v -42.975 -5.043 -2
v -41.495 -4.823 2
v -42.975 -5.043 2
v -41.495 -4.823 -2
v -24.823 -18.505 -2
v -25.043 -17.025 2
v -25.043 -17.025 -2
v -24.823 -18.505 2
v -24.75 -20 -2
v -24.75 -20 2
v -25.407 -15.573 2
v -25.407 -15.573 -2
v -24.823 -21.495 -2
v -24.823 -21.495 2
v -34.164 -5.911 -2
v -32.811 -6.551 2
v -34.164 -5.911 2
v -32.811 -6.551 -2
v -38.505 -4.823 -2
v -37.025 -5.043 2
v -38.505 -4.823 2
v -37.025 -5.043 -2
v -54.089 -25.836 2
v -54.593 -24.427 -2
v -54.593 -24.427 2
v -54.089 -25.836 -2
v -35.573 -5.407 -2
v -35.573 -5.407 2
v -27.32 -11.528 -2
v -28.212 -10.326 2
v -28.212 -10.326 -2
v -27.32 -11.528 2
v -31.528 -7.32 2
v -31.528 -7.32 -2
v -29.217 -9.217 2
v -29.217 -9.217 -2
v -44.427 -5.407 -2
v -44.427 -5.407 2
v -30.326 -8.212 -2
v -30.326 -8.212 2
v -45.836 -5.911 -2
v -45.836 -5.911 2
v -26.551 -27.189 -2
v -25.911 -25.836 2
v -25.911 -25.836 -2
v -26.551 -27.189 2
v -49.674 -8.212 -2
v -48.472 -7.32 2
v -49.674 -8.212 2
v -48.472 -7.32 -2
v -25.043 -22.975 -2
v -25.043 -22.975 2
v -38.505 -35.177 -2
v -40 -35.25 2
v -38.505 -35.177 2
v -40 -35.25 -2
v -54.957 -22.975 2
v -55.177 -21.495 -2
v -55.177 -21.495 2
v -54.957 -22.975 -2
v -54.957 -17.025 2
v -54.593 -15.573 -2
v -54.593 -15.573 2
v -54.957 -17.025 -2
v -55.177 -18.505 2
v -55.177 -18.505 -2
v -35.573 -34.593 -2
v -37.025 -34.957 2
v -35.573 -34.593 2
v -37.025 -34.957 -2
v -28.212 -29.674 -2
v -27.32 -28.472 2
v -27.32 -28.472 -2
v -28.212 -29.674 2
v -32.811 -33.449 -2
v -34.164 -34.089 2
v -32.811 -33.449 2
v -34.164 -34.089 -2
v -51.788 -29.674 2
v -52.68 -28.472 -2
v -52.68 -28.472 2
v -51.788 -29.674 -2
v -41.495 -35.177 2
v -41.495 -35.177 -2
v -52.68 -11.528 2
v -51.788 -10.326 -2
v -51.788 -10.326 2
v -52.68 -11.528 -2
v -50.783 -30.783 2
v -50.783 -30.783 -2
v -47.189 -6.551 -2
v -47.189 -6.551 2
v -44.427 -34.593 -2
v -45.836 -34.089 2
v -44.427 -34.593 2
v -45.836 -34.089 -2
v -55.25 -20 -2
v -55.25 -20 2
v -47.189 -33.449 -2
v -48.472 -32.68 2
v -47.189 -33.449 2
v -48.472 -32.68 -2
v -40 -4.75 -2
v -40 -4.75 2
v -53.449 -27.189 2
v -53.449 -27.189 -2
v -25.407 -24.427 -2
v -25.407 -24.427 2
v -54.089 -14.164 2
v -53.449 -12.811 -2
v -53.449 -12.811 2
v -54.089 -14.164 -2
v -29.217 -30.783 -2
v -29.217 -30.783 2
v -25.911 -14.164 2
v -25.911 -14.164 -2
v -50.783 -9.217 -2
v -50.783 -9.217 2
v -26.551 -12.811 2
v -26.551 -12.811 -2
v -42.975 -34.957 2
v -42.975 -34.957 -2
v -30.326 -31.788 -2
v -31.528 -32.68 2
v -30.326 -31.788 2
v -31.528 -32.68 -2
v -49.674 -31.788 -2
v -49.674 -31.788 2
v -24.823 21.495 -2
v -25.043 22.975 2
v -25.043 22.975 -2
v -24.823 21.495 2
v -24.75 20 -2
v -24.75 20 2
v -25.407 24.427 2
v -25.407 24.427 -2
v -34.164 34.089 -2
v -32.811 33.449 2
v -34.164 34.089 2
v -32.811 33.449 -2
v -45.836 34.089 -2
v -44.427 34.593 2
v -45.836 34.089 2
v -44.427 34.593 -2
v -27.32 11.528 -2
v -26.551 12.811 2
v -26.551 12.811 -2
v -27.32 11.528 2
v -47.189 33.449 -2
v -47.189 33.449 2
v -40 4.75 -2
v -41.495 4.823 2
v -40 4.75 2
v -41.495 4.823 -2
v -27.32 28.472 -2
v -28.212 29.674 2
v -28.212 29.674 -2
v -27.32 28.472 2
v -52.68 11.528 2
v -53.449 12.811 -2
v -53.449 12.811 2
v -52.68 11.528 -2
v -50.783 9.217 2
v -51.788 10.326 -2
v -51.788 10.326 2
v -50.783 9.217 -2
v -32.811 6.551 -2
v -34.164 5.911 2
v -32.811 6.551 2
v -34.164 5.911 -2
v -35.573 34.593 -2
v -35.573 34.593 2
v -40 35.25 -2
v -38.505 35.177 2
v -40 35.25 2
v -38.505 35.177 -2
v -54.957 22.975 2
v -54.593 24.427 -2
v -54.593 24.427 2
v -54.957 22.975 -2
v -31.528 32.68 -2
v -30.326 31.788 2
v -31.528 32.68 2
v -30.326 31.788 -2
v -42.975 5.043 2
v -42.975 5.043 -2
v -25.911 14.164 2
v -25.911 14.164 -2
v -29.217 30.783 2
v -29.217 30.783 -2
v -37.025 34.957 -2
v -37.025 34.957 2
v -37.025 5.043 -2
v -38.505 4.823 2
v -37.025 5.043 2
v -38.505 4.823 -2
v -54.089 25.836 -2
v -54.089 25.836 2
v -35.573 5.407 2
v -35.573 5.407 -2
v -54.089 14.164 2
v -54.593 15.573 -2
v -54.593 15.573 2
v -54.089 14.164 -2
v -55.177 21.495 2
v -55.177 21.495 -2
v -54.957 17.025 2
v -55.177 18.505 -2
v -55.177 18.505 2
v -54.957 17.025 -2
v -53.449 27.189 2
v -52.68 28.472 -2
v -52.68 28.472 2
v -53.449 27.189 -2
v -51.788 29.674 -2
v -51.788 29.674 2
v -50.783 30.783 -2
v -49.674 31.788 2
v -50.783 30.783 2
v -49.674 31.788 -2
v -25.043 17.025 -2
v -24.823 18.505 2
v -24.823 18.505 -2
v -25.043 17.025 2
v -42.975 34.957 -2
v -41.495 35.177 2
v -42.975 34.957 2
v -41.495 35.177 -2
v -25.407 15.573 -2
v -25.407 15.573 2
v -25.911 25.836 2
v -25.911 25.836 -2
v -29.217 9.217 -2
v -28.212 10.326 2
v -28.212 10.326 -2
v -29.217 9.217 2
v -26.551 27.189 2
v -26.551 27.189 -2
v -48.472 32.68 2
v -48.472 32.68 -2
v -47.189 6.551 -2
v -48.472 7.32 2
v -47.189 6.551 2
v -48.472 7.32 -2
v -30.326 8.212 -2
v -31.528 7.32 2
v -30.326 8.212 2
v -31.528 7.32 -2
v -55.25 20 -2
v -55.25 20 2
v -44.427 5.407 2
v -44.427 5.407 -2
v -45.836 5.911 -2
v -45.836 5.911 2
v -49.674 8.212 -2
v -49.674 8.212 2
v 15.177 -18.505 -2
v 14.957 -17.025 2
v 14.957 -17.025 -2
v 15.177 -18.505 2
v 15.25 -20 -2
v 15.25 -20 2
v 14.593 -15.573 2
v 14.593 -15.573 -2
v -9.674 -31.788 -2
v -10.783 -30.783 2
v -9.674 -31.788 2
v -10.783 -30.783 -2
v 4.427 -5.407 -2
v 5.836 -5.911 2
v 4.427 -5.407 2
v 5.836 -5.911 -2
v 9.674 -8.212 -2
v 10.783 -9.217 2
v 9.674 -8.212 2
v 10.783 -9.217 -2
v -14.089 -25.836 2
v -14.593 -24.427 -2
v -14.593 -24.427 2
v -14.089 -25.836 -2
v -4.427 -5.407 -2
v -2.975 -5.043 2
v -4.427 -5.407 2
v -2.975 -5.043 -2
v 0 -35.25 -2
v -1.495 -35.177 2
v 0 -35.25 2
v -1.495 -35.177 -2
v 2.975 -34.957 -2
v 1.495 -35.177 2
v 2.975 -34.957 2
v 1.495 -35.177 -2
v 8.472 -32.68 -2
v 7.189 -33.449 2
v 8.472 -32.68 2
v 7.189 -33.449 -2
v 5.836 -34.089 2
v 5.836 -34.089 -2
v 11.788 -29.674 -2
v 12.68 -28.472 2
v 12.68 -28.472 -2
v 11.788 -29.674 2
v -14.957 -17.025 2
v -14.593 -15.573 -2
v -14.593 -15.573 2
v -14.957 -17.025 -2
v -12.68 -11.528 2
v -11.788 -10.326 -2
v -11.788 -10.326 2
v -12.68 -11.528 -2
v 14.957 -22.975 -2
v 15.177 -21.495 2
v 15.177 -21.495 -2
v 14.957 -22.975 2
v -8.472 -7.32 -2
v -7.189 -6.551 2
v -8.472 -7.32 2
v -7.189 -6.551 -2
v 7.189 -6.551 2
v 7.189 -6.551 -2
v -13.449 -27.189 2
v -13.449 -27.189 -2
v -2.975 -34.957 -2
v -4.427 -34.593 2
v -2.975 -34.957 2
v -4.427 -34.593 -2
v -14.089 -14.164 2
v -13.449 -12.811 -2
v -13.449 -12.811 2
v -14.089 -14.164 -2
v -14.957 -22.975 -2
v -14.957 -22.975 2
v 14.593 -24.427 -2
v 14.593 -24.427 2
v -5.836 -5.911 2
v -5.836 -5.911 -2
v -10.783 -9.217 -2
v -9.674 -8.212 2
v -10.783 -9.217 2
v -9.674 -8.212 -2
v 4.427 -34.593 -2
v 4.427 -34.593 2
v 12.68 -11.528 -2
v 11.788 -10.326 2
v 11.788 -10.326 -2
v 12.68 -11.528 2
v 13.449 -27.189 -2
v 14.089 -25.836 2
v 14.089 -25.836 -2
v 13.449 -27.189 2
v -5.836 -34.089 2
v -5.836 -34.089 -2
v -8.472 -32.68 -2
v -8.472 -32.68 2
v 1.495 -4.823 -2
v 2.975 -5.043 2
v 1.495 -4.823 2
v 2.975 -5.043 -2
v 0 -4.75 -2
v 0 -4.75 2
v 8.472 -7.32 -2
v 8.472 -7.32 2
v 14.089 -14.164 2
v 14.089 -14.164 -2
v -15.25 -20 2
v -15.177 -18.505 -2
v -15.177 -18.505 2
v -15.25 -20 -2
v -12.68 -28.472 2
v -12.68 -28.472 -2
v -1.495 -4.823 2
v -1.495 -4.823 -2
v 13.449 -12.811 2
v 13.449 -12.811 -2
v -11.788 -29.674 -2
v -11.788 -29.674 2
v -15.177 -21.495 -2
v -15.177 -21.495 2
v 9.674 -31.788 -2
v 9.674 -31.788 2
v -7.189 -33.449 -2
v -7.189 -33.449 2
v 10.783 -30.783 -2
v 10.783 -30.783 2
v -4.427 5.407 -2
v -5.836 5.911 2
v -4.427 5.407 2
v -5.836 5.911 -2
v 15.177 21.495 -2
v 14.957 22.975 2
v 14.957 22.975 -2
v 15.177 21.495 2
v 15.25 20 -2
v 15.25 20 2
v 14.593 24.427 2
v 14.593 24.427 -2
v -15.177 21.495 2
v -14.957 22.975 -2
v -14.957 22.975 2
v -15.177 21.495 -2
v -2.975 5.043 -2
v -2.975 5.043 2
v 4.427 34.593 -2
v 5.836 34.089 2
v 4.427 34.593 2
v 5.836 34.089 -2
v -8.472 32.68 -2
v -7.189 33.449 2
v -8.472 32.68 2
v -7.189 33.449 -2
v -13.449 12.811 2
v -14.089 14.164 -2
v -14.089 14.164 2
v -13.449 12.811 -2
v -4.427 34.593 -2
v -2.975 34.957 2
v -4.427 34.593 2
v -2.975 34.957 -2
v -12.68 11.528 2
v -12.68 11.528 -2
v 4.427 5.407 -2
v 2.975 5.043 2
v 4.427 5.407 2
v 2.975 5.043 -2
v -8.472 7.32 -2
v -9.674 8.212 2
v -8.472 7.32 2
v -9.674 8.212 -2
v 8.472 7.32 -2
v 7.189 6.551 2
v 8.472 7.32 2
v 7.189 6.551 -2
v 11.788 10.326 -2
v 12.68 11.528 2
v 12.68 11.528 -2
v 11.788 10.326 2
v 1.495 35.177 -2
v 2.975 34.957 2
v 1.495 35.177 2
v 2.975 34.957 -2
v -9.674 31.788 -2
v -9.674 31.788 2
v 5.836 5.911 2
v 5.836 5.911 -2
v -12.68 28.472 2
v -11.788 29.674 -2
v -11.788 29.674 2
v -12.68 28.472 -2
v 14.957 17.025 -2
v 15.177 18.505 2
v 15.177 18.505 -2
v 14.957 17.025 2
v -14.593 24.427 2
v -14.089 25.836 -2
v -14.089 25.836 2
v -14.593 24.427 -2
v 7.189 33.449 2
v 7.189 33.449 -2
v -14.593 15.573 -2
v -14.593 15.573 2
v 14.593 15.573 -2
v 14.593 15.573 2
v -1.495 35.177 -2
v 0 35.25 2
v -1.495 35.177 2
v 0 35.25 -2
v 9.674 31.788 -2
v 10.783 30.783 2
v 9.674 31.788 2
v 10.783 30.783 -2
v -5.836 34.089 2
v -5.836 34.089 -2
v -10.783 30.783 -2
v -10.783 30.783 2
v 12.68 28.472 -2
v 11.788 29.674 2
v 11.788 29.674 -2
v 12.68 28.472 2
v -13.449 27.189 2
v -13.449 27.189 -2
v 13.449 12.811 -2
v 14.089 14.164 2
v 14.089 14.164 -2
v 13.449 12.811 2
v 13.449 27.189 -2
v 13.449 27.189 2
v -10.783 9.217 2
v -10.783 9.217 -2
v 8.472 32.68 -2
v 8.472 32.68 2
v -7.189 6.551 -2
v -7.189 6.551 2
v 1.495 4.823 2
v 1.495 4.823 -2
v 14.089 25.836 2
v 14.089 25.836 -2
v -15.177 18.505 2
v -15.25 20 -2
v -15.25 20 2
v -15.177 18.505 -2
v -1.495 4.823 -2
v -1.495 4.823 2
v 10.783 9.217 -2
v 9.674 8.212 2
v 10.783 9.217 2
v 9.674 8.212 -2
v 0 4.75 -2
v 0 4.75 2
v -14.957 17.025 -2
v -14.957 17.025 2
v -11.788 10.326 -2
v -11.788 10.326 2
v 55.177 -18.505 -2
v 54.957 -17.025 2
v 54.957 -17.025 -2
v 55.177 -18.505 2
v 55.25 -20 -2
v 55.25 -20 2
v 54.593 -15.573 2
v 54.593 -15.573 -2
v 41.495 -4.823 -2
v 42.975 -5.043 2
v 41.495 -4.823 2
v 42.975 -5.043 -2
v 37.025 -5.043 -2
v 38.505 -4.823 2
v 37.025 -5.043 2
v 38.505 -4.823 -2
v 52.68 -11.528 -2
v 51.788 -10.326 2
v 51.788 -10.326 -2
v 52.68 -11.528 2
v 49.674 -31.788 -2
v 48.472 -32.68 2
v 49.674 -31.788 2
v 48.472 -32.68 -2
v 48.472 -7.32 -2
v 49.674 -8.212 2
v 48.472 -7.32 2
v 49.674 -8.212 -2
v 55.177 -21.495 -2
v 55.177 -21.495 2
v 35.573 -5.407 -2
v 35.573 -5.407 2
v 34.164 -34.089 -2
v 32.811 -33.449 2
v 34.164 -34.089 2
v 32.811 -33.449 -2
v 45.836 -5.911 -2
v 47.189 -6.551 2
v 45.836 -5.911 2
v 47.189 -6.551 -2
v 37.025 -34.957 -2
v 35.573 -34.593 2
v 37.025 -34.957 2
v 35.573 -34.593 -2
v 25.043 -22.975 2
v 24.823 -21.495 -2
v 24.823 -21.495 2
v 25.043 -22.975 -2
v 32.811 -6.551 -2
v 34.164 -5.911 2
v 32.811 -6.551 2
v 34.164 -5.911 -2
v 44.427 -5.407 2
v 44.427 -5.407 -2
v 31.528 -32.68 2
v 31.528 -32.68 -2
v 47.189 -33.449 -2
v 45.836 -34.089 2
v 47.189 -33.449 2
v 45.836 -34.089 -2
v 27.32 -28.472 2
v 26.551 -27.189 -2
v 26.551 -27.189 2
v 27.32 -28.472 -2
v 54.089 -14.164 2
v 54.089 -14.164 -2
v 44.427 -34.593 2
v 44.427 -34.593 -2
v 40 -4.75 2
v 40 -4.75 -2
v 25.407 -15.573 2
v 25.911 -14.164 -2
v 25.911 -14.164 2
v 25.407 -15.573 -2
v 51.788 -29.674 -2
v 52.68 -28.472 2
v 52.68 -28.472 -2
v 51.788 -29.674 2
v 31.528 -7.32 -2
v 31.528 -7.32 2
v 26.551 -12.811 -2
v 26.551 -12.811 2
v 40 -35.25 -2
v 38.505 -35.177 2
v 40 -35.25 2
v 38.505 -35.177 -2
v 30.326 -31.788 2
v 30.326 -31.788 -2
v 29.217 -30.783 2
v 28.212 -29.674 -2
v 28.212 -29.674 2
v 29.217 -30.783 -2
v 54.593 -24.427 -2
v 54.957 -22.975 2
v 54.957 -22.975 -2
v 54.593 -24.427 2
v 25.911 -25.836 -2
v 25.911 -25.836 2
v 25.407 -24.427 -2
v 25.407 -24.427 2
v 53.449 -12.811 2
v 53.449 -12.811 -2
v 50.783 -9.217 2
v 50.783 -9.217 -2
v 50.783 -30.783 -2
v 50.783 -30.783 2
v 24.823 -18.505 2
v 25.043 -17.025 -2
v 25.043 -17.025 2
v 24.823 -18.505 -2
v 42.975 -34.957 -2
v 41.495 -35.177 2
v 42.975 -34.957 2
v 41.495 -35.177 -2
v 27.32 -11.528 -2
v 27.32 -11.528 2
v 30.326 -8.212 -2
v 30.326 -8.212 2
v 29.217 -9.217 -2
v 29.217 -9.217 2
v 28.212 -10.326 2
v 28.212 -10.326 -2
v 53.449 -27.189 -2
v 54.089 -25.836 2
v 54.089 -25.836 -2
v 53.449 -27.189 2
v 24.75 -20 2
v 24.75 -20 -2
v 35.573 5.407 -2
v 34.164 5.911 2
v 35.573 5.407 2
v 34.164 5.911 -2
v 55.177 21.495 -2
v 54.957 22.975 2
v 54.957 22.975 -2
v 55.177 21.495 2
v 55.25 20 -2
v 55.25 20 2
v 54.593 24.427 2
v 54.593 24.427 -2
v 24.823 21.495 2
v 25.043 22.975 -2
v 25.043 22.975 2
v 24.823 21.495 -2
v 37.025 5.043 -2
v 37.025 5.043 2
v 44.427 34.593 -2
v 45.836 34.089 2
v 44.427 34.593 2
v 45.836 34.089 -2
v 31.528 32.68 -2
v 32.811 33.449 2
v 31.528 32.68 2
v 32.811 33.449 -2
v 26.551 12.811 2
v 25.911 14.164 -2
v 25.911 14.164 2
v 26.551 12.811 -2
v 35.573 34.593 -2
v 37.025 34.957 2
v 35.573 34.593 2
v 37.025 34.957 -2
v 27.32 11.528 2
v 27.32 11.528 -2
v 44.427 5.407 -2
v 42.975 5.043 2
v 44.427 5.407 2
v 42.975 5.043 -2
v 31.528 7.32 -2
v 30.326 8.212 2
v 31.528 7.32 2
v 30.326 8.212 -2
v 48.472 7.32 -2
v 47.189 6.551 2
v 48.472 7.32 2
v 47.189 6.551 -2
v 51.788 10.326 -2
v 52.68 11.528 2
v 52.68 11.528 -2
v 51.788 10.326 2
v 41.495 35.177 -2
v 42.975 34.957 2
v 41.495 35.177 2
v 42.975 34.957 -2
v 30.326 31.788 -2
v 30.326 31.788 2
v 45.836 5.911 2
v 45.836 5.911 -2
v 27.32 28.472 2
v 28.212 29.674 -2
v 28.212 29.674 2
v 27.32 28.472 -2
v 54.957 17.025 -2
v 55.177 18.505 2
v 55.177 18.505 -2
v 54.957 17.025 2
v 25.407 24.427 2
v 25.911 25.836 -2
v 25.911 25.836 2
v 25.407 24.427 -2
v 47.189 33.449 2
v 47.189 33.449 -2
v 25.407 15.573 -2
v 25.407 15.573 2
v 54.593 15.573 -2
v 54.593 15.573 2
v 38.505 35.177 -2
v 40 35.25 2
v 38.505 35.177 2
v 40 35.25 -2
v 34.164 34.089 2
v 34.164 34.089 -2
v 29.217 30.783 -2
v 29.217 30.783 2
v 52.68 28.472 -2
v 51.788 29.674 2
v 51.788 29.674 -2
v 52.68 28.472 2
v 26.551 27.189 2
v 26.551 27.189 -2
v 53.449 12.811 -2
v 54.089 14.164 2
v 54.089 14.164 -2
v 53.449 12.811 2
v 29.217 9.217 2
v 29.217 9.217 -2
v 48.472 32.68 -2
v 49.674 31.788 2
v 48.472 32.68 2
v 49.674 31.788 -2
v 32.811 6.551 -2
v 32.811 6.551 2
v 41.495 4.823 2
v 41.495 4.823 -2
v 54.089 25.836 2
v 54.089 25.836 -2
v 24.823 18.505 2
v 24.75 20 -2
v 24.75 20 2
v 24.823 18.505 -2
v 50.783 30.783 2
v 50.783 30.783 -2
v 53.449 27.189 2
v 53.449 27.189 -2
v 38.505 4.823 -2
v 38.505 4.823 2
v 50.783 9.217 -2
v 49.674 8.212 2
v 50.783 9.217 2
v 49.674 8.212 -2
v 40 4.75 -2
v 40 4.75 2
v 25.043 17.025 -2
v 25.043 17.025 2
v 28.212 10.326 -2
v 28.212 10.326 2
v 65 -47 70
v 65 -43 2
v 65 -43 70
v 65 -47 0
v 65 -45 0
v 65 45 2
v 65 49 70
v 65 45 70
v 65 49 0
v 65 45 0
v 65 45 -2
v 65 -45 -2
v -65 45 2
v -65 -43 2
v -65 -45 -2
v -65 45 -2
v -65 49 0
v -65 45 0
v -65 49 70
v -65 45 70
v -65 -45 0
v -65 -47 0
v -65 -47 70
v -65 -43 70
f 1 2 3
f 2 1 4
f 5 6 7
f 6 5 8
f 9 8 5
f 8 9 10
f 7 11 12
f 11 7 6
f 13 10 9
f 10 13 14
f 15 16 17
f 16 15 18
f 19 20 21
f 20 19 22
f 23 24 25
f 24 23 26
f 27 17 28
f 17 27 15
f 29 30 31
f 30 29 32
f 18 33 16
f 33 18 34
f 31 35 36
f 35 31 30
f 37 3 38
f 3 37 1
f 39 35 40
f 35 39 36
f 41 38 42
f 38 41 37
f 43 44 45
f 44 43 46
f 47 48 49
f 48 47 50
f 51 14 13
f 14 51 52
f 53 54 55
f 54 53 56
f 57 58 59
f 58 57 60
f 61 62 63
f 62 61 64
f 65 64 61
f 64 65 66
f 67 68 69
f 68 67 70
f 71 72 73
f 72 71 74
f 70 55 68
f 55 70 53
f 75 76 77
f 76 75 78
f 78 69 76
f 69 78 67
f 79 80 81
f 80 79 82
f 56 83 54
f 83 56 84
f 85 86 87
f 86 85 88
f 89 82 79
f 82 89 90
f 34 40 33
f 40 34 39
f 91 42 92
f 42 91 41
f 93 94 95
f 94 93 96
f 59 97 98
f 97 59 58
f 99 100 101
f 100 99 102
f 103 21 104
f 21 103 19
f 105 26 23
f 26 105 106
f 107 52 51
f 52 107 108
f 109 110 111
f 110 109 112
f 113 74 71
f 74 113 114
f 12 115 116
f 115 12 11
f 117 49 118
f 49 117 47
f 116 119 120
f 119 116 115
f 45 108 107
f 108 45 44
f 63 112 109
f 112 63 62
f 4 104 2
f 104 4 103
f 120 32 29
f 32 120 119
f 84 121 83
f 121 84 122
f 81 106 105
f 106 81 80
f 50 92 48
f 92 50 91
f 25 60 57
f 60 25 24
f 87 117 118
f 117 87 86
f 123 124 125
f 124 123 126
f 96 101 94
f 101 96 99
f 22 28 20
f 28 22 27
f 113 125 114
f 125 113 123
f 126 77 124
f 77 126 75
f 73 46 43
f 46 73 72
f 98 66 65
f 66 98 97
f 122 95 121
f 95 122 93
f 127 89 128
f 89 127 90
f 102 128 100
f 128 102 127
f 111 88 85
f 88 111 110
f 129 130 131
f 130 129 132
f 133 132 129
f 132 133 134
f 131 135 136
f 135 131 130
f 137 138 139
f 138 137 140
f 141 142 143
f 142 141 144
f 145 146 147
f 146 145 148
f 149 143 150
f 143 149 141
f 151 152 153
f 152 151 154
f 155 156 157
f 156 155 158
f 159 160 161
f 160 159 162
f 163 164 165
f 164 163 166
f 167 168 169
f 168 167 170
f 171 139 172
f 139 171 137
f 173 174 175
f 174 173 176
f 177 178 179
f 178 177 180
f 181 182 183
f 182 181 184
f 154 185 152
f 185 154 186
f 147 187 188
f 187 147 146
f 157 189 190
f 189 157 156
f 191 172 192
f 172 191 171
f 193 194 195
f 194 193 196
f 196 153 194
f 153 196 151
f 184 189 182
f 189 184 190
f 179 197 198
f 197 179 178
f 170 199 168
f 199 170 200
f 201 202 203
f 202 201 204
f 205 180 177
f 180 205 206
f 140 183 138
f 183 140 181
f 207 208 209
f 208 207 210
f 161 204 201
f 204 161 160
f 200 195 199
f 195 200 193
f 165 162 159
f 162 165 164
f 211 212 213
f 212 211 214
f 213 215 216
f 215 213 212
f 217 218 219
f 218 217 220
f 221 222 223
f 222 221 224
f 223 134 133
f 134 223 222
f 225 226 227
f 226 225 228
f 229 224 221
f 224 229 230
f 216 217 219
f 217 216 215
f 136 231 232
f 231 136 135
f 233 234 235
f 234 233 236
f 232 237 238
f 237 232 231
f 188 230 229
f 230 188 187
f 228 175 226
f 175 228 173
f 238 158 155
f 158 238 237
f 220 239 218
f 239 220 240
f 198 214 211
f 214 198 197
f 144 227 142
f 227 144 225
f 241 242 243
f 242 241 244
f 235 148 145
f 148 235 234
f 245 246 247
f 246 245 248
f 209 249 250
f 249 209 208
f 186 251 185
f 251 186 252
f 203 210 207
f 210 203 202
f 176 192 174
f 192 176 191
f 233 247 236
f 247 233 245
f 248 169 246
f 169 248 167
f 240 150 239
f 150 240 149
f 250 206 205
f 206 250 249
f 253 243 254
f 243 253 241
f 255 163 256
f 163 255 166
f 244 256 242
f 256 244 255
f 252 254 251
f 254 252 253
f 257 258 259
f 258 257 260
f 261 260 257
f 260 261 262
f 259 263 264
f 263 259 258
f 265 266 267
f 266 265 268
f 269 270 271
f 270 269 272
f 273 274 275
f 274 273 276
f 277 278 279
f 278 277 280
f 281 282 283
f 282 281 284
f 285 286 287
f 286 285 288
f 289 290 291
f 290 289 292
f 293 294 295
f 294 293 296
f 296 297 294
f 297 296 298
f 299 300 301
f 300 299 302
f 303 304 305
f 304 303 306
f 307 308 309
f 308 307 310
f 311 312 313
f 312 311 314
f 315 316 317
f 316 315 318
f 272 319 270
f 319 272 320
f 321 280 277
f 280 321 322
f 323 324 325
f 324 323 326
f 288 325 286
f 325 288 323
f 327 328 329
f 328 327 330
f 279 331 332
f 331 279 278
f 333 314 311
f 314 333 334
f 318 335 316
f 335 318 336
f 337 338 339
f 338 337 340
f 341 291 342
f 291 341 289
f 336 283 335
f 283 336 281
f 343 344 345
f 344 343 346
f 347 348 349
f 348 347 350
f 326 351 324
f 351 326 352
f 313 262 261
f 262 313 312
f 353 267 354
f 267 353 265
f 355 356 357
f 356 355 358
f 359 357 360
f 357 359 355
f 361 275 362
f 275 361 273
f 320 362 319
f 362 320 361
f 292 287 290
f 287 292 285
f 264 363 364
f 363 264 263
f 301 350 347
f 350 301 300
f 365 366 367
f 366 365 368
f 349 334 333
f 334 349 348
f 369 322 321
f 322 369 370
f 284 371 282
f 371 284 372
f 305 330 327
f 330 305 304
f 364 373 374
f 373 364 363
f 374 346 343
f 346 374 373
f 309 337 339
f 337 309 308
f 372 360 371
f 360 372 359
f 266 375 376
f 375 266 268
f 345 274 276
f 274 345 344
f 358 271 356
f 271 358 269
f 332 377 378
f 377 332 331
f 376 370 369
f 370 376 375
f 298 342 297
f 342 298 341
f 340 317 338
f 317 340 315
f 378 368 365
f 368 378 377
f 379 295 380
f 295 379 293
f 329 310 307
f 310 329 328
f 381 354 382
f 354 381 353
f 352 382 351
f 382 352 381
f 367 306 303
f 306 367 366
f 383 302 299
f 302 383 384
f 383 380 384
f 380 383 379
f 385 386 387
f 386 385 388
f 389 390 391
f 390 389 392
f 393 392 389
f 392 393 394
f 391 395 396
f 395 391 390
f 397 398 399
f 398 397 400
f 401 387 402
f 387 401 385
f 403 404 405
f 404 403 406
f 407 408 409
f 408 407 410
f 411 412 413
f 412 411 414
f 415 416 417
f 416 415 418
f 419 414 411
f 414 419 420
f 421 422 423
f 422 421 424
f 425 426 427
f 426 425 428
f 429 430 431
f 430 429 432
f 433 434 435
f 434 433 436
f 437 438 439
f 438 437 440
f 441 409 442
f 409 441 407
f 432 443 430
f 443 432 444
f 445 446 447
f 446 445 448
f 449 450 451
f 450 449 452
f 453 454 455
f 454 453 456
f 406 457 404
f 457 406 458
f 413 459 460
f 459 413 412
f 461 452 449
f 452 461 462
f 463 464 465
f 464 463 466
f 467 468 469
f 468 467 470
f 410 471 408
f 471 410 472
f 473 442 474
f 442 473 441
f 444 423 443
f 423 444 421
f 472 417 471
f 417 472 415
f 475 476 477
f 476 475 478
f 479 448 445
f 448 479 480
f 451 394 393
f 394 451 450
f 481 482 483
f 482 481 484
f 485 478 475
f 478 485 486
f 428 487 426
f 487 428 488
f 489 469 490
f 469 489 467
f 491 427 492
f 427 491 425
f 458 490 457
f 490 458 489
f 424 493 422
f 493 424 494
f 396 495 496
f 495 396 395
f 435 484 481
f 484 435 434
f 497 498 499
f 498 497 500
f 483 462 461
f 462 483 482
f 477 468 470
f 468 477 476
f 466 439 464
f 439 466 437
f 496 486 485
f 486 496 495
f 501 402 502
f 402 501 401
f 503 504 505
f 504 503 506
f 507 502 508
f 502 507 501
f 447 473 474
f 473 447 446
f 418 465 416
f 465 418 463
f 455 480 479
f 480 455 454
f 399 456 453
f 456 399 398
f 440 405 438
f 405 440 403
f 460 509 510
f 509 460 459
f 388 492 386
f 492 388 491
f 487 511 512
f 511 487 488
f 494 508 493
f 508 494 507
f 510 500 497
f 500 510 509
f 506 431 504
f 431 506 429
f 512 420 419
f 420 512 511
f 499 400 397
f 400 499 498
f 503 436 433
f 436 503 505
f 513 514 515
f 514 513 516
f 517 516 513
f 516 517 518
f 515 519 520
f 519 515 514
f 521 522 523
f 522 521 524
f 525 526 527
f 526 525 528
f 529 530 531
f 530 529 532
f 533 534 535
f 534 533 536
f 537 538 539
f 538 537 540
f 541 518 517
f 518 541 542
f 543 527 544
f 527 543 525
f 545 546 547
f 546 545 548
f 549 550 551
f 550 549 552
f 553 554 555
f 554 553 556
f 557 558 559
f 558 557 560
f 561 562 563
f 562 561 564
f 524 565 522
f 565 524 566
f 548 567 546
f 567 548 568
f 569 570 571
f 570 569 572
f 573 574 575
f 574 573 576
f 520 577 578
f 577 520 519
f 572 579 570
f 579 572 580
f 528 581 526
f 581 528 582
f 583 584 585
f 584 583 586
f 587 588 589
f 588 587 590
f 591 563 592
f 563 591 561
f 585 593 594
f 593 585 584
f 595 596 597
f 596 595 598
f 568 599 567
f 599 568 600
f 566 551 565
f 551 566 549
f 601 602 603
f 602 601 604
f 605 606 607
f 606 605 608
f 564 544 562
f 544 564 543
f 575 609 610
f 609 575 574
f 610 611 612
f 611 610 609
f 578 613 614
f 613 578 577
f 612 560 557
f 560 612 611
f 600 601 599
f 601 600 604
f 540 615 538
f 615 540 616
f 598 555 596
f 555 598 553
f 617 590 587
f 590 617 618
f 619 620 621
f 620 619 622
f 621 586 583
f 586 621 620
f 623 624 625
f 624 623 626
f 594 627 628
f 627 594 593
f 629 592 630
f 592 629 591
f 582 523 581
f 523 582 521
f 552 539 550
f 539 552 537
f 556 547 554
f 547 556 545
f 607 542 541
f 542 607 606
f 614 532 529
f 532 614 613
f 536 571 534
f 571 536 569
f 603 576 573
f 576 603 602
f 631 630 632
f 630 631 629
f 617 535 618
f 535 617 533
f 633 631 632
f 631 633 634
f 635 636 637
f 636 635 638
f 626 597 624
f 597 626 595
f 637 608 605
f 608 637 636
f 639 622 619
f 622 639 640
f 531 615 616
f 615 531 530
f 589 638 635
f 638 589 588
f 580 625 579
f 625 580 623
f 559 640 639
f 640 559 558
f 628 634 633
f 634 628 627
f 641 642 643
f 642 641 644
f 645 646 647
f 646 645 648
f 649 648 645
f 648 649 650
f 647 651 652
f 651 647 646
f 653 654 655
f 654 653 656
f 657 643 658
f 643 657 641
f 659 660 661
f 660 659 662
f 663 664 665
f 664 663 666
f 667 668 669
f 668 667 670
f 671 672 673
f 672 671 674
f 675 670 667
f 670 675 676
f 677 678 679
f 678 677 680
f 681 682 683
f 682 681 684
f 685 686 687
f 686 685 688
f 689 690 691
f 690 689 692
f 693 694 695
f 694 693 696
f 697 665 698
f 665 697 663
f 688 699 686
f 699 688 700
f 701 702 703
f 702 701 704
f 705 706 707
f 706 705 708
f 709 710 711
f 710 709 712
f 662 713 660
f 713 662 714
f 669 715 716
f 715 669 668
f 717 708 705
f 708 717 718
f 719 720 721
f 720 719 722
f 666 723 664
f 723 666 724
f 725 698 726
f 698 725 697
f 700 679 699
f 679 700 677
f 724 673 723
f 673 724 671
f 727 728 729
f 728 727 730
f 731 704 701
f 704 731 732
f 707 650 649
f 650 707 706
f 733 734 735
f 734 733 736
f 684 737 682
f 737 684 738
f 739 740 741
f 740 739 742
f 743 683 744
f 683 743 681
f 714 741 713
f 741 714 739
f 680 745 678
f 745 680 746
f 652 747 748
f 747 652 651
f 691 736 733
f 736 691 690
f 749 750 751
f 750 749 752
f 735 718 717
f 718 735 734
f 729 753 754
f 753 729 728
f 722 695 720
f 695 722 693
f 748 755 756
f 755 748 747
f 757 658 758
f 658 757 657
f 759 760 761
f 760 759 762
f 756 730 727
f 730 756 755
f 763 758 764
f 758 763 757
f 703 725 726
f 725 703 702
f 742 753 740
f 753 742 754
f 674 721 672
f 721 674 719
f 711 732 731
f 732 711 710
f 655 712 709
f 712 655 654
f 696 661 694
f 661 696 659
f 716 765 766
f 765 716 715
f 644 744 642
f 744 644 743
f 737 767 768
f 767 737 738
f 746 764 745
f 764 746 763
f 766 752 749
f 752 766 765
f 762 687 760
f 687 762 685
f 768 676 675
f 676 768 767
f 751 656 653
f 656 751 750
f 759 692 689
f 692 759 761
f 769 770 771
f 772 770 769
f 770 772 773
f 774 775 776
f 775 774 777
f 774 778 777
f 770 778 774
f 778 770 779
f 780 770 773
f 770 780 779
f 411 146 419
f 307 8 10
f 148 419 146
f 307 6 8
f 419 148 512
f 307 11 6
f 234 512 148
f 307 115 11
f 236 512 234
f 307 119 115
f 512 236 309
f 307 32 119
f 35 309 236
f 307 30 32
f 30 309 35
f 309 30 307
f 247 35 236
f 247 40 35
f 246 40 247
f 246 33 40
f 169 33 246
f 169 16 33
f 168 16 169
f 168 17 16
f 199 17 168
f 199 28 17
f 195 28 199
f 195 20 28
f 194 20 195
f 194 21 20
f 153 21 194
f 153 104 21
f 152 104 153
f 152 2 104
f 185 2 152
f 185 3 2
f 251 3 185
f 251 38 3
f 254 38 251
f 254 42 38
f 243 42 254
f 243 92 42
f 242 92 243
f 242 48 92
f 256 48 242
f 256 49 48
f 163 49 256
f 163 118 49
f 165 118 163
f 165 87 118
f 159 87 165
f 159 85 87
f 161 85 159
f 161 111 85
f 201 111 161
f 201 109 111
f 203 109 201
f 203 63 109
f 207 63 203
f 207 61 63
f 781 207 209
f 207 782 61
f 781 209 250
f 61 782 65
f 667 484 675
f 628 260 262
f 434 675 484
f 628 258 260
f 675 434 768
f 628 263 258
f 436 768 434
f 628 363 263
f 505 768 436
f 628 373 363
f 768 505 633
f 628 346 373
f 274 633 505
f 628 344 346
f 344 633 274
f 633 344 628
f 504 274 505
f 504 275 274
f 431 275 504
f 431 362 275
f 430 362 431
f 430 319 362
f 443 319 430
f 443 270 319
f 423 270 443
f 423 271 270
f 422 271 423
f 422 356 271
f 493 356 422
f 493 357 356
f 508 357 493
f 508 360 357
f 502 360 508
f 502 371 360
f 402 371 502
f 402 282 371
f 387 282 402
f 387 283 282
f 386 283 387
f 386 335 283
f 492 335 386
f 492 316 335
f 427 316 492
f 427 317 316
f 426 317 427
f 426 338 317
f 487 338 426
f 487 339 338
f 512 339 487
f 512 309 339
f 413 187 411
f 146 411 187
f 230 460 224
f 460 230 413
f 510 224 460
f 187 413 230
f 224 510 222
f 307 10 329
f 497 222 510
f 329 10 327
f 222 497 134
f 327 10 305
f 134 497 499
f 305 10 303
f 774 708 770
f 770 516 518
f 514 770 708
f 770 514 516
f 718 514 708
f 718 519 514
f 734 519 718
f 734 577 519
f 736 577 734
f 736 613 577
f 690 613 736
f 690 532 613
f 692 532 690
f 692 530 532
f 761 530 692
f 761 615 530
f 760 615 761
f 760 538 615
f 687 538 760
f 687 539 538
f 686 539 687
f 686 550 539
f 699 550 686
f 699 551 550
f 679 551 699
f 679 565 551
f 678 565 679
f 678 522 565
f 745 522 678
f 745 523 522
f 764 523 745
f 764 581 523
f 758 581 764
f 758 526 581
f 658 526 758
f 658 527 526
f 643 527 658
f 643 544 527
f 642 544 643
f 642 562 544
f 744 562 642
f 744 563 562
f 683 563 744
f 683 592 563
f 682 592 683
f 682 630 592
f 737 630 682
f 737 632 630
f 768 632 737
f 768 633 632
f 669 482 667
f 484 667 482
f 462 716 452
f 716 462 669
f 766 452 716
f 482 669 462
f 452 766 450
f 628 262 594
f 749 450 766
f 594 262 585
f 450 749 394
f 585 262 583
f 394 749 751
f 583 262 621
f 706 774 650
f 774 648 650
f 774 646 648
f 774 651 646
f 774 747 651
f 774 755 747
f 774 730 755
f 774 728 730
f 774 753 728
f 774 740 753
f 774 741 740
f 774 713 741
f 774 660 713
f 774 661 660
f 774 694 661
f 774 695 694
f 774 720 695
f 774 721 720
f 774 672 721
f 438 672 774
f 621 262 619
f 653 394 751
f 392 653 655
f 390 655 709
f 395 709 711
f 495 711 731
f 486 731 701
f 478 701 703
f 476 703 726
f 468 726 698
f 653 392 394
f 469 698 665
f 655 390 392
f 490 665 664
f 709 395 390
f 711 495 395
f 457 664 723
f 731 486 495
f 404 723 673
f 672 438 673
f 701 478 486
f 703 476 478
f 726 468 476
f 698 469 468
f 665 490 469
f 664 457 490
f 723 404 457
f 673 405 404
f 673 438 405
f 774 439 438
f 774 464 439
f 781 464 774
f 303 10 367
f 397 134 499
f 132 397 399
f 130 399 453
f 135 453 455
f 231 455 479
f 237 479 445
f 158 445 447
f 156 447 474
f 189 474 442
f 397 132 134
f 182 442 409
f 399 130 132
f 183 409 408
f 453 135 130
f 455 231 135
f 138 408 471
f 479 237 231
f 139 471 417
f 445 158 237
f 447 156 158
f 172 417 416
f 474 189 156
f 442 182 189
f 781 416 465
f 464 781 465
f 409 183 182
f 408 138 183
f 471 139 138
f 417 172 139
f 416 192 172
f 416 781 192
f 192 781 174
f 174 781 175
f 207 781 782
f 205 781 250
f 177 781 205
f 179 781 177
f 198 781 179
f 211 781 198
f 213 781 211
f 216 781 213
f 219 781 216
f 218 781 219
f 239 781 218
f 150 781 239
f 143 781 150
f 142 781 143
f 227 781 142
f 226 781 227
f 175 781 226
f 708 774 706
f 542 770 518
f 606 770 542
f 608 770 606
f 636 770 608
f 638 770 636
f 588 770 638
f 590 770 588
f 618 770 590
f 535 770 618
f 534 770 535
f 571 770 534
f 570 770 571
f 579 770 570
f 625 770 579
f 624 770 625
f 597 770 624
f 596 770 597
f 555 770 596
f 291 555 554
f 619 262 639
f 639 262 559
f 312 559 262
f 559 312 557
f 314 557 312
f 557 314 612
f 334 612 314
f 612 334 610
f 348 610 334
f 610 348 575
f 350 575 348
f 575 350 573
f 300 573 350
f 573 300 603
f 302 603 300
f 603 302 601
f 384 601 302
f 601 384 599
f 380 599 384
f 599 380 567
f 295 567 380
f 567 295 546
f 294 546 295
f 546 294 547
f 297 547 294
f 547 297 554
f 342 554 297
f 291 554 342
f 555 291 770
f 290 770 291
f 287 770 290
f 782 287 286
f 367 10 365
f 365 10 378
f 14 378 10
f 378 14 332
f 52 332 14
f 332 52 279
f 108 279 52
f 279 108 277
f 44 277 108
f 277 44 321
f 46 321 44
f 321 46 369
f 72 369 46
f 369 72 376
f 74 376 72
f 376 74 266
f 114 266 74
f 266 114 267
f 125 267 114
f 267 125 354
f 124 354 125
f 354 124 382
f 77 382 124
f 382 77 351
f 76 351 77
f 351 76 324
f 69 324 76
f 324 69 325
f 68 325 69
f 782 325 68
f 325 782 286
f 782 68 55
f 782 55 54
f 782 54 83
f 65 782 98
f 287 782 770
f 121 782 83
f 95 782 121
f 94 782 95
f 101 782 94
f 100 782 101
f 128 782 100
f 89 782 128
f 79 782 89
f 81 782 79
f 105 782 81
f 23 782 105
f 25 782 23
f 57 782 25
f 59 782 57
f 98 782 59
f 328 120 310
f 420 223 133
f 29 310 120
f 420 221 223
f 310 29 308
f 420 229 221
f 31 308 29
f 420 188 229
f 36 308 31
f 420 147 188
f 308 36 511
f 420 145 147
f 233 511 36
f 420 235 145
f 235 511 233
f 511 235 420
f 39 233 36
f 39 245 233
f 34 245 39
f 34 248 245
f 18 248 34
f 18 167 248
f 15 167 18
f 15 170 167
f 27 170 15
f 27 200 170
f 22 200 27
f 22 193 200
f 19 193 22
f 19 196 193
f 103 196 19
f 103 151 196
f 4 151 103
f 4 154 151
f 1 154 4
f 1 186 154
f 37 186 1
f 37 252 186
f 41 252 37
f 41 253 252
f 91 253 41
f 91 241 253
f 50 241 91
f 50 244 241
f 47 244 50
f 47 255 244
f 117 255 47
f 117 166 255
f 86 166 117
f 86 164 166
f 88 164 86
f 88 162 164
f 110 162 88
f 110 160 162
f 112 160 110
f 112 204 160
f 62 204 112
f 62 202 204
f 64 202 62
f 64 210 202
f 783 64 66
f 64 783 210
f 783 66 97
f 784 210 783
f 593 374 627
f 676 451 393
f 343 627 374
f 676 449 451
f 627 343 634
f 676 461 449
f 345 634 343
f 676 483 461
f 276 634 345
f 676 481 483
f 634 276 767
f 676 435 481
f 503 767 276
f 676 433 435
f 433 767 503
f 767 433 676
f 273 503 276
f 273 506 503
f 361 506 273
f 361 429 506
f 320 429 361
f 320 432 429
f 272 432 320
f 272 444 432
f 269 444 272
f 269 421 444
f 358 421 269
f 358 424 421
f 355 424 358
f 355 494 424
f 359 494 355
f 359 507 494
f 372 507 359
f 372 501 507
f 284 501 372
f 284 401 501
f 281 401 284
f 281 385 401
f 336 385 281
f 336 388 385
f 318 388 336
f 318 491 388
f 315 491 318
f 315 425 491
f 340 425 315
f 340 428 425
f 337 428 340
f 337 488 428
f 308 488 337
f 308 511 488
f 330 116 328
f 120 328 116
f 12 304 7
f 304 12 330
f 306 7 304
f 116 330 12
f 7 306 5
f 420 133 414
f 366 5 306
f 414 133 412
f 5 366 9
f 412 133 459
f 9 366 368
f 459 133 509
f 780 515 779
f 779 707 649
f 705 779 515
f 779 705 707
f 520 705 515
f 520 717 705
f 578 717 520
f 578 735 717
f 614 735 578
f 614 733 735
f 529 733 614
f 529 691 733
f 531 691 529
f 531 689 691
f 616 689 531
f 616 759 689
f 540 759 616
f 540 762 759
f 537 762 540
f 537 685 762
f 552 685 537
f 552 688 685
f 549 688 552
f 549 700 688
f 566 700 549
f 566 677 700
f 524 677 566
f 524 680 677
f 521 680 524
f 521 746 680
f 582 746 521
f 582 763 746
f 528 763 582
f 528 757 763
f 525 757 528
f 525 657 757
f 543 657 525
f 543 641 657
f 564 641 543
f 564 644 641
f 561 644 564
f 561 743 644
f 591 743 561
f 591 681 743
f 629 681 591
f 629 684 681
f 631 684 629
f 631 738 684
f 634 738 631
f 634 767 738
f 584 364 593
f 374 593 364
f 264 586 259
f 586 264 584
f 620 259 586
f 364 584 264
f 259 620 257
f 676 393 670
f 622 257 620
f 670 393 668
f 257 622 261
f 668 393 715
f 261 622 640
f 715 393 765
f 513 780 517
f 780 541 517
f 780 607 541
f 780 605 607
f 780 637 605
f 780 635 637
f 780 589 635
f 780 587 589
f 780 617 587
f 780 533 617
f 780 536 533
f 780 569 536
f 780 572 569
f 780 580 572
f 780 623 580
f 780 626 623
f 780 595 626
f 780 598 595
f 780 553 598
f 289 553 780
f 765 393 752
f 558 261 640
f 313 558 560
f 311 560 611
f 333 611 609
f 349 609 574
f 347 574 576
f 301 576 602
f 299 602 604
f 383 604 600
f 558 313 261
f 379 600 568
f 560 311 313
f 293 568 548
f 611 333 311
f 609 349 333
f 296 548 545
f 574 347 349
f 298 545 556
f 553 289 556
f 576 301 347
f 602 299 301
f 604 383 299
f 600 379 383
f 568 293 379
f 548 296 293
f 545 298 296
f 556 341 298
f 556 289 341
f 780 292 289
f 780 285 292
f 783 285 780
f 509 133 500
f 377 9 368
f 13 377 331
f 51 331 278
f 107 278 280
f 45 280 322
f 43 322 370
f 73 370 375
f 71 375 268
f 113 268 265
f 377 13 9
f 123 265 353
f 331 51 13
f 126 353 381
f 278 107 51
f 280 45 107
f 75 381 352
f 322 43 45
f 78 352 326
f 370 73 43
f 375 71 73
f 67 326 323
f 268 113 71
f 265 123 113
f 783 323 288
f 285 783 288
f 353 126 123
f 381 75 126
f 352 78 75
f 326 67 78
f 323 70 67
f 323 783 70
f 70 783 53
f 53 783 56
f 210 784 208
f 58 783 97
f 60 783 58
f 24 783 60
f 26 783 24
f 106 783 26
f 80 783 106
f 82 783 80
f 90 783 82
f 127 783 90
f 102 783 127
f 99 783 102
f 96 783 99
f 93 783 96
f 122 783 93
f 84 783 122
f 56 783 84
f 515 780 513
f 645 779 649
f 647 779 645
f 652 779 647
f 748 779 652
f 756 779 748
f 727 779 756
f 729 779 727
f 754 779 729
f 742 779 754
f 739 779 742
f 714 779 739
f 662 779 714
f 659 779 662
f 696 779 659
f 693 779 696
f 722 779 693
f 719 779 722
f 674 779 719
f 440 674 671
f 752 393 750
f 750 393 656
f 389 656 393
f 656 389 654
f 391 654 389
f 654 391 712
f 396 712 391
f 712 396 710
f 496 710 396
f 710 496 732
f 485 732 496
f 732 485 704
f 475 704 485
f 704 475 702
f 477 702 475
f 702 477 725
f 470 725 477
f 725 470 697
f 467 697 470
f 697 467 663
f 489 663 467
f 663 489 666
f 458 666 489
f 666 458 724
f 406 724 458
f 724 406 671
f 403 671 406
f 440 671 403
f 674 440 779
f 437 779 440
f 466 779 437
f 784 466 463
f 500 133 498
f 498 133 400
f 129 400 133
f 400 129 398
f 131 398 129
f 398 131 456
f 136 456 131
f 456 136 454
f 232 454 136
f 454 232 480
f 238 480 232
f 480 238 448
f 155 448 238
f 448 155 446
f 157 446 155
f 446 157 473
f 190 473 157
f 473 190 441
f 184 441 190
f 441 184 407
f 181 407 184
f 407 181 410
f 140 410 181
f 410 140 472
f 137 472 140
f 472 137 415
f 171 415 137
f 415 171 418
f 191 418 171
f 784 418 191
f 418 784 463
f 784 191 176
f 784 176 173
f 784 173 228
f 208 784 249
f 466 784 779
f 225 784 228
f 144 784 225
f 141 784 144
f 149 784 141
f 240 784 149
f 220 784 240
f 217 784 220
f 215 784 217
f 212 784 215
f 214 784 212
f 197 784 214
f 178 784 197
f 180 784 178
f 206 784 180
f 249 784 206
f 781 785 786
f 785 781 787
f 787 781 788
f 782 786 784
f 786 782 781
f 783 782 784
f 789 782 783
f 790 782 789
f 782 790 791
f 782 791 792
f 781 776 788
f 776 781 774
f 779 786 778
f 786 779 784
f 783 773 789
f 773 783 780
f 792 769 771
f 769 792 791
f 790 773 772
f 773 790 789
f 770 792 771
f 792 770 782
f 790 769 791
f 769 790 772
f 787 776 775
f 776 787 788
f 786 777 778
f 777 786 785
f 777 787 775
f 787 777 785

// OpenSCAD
// Dimensions
plate_x = 130;
plate_y = 90;
plate_z = 4;

wall_height = 70;
wall_thickness = 4;

tube_hole_diameter = 30.5;

// Grid parameters
num_rows = 2; // Along Y
num_cols = 3; // Along X
pitch_x = 40;
pitch_y = 40;

// Calculated positions
// Center of the plate is at (0,0)
// X range: -plate_x/2 to plate_x/2
// Y range: -plate_y/2 to plate_y/2

// Hole centers
// X positions: -pitch_x, 0, pitch_x (centered around 0)
// Y positions: -pitch_y/2, pitch_y/2 (centered around 0)
// Wait, 3 columns with 40mm pitch: -40, 0, 40.
// 2 rows with 40mm pitch: -20, 20.

hole_x_positions = [-pitch_x, 0, pitch_x];
hole_y_positions = [-pitch_y/2, pitch_y/2];

// Wall positions
// Long edges are along X. Walls are at Y = -plate_y/2 and Y = plate_y/2.
// Wall length is 130mm (X).
// Wall thickness is 4mm (Y).
// So walls extend from Y = -plate_y/2 - 4 to -plate_y/2 and Y = plate_y/2 to plate_y/2 + 4?
// "flush with the plate's long edge" usually means the outer face is flush or the inner face is flush.
// Given "Two solid walls run along the two long edges... flush with the plate's long edge",
// and the plate is 90mm wide. If the walls are on the outside, the total width is 90 + 4 + 4 = 98.
// If they are on the inside, the total width is 90.
// "flush with the plate's long edge" implies the outer surface of the wall aligns with the outer surface of the plate.
// So the walls extend outwards from the plate.

// Let's define the main plate body
// Plate: 130x90x4

// Let's define the walls
// Wall 1 (Y negative side): X: -65 to 65, Y: -45-4 to -45, Z: 0 to 70
// Wall 2 (Y positive side): X: -65 to 65, Y: 45 to 45+4, Z: 0 to 70

// Holes
// Through holes in the plate.
// Diameter 30.5.
// Centers at (x, y) from lists above.

// Build
module rack() {
    // 1. Main Plate
    difference() {
        // Base plate
        cube([plate_x, plate_y, plate_z], center = true);
        
        // Cut holes
        for (x = hole_x_positions) {
            for (y = hole_y_positions) {
                // Extend hole slightly past z=0 and z=plate_z to ensure clean cut
                // Plate is z=0 to z=4.
                // Hole extends from -0.1 to 4.1
                translate([x, y, 0]) {
                    cylinder(d = tube_hole_diameter, h = plate_z + 0.2, center = true, $fn = 64);
                }
            }
        }
    }

    // 2. Walls
    // Wall 1 (Negative Y)
    translate([-plate_x/2, -plate_y/2 - wall_thickness/2, 0]) {
        cube([plate_x, wall_thickness, wall_height], center = false);
    }
    
    // Wall 2 (Positive Y)
    translate([-plate_x/2, plate_y/2, 0]) {
        cube([plate_x, wall_thickness, wall_height], center = false);
    }
}

rack();
